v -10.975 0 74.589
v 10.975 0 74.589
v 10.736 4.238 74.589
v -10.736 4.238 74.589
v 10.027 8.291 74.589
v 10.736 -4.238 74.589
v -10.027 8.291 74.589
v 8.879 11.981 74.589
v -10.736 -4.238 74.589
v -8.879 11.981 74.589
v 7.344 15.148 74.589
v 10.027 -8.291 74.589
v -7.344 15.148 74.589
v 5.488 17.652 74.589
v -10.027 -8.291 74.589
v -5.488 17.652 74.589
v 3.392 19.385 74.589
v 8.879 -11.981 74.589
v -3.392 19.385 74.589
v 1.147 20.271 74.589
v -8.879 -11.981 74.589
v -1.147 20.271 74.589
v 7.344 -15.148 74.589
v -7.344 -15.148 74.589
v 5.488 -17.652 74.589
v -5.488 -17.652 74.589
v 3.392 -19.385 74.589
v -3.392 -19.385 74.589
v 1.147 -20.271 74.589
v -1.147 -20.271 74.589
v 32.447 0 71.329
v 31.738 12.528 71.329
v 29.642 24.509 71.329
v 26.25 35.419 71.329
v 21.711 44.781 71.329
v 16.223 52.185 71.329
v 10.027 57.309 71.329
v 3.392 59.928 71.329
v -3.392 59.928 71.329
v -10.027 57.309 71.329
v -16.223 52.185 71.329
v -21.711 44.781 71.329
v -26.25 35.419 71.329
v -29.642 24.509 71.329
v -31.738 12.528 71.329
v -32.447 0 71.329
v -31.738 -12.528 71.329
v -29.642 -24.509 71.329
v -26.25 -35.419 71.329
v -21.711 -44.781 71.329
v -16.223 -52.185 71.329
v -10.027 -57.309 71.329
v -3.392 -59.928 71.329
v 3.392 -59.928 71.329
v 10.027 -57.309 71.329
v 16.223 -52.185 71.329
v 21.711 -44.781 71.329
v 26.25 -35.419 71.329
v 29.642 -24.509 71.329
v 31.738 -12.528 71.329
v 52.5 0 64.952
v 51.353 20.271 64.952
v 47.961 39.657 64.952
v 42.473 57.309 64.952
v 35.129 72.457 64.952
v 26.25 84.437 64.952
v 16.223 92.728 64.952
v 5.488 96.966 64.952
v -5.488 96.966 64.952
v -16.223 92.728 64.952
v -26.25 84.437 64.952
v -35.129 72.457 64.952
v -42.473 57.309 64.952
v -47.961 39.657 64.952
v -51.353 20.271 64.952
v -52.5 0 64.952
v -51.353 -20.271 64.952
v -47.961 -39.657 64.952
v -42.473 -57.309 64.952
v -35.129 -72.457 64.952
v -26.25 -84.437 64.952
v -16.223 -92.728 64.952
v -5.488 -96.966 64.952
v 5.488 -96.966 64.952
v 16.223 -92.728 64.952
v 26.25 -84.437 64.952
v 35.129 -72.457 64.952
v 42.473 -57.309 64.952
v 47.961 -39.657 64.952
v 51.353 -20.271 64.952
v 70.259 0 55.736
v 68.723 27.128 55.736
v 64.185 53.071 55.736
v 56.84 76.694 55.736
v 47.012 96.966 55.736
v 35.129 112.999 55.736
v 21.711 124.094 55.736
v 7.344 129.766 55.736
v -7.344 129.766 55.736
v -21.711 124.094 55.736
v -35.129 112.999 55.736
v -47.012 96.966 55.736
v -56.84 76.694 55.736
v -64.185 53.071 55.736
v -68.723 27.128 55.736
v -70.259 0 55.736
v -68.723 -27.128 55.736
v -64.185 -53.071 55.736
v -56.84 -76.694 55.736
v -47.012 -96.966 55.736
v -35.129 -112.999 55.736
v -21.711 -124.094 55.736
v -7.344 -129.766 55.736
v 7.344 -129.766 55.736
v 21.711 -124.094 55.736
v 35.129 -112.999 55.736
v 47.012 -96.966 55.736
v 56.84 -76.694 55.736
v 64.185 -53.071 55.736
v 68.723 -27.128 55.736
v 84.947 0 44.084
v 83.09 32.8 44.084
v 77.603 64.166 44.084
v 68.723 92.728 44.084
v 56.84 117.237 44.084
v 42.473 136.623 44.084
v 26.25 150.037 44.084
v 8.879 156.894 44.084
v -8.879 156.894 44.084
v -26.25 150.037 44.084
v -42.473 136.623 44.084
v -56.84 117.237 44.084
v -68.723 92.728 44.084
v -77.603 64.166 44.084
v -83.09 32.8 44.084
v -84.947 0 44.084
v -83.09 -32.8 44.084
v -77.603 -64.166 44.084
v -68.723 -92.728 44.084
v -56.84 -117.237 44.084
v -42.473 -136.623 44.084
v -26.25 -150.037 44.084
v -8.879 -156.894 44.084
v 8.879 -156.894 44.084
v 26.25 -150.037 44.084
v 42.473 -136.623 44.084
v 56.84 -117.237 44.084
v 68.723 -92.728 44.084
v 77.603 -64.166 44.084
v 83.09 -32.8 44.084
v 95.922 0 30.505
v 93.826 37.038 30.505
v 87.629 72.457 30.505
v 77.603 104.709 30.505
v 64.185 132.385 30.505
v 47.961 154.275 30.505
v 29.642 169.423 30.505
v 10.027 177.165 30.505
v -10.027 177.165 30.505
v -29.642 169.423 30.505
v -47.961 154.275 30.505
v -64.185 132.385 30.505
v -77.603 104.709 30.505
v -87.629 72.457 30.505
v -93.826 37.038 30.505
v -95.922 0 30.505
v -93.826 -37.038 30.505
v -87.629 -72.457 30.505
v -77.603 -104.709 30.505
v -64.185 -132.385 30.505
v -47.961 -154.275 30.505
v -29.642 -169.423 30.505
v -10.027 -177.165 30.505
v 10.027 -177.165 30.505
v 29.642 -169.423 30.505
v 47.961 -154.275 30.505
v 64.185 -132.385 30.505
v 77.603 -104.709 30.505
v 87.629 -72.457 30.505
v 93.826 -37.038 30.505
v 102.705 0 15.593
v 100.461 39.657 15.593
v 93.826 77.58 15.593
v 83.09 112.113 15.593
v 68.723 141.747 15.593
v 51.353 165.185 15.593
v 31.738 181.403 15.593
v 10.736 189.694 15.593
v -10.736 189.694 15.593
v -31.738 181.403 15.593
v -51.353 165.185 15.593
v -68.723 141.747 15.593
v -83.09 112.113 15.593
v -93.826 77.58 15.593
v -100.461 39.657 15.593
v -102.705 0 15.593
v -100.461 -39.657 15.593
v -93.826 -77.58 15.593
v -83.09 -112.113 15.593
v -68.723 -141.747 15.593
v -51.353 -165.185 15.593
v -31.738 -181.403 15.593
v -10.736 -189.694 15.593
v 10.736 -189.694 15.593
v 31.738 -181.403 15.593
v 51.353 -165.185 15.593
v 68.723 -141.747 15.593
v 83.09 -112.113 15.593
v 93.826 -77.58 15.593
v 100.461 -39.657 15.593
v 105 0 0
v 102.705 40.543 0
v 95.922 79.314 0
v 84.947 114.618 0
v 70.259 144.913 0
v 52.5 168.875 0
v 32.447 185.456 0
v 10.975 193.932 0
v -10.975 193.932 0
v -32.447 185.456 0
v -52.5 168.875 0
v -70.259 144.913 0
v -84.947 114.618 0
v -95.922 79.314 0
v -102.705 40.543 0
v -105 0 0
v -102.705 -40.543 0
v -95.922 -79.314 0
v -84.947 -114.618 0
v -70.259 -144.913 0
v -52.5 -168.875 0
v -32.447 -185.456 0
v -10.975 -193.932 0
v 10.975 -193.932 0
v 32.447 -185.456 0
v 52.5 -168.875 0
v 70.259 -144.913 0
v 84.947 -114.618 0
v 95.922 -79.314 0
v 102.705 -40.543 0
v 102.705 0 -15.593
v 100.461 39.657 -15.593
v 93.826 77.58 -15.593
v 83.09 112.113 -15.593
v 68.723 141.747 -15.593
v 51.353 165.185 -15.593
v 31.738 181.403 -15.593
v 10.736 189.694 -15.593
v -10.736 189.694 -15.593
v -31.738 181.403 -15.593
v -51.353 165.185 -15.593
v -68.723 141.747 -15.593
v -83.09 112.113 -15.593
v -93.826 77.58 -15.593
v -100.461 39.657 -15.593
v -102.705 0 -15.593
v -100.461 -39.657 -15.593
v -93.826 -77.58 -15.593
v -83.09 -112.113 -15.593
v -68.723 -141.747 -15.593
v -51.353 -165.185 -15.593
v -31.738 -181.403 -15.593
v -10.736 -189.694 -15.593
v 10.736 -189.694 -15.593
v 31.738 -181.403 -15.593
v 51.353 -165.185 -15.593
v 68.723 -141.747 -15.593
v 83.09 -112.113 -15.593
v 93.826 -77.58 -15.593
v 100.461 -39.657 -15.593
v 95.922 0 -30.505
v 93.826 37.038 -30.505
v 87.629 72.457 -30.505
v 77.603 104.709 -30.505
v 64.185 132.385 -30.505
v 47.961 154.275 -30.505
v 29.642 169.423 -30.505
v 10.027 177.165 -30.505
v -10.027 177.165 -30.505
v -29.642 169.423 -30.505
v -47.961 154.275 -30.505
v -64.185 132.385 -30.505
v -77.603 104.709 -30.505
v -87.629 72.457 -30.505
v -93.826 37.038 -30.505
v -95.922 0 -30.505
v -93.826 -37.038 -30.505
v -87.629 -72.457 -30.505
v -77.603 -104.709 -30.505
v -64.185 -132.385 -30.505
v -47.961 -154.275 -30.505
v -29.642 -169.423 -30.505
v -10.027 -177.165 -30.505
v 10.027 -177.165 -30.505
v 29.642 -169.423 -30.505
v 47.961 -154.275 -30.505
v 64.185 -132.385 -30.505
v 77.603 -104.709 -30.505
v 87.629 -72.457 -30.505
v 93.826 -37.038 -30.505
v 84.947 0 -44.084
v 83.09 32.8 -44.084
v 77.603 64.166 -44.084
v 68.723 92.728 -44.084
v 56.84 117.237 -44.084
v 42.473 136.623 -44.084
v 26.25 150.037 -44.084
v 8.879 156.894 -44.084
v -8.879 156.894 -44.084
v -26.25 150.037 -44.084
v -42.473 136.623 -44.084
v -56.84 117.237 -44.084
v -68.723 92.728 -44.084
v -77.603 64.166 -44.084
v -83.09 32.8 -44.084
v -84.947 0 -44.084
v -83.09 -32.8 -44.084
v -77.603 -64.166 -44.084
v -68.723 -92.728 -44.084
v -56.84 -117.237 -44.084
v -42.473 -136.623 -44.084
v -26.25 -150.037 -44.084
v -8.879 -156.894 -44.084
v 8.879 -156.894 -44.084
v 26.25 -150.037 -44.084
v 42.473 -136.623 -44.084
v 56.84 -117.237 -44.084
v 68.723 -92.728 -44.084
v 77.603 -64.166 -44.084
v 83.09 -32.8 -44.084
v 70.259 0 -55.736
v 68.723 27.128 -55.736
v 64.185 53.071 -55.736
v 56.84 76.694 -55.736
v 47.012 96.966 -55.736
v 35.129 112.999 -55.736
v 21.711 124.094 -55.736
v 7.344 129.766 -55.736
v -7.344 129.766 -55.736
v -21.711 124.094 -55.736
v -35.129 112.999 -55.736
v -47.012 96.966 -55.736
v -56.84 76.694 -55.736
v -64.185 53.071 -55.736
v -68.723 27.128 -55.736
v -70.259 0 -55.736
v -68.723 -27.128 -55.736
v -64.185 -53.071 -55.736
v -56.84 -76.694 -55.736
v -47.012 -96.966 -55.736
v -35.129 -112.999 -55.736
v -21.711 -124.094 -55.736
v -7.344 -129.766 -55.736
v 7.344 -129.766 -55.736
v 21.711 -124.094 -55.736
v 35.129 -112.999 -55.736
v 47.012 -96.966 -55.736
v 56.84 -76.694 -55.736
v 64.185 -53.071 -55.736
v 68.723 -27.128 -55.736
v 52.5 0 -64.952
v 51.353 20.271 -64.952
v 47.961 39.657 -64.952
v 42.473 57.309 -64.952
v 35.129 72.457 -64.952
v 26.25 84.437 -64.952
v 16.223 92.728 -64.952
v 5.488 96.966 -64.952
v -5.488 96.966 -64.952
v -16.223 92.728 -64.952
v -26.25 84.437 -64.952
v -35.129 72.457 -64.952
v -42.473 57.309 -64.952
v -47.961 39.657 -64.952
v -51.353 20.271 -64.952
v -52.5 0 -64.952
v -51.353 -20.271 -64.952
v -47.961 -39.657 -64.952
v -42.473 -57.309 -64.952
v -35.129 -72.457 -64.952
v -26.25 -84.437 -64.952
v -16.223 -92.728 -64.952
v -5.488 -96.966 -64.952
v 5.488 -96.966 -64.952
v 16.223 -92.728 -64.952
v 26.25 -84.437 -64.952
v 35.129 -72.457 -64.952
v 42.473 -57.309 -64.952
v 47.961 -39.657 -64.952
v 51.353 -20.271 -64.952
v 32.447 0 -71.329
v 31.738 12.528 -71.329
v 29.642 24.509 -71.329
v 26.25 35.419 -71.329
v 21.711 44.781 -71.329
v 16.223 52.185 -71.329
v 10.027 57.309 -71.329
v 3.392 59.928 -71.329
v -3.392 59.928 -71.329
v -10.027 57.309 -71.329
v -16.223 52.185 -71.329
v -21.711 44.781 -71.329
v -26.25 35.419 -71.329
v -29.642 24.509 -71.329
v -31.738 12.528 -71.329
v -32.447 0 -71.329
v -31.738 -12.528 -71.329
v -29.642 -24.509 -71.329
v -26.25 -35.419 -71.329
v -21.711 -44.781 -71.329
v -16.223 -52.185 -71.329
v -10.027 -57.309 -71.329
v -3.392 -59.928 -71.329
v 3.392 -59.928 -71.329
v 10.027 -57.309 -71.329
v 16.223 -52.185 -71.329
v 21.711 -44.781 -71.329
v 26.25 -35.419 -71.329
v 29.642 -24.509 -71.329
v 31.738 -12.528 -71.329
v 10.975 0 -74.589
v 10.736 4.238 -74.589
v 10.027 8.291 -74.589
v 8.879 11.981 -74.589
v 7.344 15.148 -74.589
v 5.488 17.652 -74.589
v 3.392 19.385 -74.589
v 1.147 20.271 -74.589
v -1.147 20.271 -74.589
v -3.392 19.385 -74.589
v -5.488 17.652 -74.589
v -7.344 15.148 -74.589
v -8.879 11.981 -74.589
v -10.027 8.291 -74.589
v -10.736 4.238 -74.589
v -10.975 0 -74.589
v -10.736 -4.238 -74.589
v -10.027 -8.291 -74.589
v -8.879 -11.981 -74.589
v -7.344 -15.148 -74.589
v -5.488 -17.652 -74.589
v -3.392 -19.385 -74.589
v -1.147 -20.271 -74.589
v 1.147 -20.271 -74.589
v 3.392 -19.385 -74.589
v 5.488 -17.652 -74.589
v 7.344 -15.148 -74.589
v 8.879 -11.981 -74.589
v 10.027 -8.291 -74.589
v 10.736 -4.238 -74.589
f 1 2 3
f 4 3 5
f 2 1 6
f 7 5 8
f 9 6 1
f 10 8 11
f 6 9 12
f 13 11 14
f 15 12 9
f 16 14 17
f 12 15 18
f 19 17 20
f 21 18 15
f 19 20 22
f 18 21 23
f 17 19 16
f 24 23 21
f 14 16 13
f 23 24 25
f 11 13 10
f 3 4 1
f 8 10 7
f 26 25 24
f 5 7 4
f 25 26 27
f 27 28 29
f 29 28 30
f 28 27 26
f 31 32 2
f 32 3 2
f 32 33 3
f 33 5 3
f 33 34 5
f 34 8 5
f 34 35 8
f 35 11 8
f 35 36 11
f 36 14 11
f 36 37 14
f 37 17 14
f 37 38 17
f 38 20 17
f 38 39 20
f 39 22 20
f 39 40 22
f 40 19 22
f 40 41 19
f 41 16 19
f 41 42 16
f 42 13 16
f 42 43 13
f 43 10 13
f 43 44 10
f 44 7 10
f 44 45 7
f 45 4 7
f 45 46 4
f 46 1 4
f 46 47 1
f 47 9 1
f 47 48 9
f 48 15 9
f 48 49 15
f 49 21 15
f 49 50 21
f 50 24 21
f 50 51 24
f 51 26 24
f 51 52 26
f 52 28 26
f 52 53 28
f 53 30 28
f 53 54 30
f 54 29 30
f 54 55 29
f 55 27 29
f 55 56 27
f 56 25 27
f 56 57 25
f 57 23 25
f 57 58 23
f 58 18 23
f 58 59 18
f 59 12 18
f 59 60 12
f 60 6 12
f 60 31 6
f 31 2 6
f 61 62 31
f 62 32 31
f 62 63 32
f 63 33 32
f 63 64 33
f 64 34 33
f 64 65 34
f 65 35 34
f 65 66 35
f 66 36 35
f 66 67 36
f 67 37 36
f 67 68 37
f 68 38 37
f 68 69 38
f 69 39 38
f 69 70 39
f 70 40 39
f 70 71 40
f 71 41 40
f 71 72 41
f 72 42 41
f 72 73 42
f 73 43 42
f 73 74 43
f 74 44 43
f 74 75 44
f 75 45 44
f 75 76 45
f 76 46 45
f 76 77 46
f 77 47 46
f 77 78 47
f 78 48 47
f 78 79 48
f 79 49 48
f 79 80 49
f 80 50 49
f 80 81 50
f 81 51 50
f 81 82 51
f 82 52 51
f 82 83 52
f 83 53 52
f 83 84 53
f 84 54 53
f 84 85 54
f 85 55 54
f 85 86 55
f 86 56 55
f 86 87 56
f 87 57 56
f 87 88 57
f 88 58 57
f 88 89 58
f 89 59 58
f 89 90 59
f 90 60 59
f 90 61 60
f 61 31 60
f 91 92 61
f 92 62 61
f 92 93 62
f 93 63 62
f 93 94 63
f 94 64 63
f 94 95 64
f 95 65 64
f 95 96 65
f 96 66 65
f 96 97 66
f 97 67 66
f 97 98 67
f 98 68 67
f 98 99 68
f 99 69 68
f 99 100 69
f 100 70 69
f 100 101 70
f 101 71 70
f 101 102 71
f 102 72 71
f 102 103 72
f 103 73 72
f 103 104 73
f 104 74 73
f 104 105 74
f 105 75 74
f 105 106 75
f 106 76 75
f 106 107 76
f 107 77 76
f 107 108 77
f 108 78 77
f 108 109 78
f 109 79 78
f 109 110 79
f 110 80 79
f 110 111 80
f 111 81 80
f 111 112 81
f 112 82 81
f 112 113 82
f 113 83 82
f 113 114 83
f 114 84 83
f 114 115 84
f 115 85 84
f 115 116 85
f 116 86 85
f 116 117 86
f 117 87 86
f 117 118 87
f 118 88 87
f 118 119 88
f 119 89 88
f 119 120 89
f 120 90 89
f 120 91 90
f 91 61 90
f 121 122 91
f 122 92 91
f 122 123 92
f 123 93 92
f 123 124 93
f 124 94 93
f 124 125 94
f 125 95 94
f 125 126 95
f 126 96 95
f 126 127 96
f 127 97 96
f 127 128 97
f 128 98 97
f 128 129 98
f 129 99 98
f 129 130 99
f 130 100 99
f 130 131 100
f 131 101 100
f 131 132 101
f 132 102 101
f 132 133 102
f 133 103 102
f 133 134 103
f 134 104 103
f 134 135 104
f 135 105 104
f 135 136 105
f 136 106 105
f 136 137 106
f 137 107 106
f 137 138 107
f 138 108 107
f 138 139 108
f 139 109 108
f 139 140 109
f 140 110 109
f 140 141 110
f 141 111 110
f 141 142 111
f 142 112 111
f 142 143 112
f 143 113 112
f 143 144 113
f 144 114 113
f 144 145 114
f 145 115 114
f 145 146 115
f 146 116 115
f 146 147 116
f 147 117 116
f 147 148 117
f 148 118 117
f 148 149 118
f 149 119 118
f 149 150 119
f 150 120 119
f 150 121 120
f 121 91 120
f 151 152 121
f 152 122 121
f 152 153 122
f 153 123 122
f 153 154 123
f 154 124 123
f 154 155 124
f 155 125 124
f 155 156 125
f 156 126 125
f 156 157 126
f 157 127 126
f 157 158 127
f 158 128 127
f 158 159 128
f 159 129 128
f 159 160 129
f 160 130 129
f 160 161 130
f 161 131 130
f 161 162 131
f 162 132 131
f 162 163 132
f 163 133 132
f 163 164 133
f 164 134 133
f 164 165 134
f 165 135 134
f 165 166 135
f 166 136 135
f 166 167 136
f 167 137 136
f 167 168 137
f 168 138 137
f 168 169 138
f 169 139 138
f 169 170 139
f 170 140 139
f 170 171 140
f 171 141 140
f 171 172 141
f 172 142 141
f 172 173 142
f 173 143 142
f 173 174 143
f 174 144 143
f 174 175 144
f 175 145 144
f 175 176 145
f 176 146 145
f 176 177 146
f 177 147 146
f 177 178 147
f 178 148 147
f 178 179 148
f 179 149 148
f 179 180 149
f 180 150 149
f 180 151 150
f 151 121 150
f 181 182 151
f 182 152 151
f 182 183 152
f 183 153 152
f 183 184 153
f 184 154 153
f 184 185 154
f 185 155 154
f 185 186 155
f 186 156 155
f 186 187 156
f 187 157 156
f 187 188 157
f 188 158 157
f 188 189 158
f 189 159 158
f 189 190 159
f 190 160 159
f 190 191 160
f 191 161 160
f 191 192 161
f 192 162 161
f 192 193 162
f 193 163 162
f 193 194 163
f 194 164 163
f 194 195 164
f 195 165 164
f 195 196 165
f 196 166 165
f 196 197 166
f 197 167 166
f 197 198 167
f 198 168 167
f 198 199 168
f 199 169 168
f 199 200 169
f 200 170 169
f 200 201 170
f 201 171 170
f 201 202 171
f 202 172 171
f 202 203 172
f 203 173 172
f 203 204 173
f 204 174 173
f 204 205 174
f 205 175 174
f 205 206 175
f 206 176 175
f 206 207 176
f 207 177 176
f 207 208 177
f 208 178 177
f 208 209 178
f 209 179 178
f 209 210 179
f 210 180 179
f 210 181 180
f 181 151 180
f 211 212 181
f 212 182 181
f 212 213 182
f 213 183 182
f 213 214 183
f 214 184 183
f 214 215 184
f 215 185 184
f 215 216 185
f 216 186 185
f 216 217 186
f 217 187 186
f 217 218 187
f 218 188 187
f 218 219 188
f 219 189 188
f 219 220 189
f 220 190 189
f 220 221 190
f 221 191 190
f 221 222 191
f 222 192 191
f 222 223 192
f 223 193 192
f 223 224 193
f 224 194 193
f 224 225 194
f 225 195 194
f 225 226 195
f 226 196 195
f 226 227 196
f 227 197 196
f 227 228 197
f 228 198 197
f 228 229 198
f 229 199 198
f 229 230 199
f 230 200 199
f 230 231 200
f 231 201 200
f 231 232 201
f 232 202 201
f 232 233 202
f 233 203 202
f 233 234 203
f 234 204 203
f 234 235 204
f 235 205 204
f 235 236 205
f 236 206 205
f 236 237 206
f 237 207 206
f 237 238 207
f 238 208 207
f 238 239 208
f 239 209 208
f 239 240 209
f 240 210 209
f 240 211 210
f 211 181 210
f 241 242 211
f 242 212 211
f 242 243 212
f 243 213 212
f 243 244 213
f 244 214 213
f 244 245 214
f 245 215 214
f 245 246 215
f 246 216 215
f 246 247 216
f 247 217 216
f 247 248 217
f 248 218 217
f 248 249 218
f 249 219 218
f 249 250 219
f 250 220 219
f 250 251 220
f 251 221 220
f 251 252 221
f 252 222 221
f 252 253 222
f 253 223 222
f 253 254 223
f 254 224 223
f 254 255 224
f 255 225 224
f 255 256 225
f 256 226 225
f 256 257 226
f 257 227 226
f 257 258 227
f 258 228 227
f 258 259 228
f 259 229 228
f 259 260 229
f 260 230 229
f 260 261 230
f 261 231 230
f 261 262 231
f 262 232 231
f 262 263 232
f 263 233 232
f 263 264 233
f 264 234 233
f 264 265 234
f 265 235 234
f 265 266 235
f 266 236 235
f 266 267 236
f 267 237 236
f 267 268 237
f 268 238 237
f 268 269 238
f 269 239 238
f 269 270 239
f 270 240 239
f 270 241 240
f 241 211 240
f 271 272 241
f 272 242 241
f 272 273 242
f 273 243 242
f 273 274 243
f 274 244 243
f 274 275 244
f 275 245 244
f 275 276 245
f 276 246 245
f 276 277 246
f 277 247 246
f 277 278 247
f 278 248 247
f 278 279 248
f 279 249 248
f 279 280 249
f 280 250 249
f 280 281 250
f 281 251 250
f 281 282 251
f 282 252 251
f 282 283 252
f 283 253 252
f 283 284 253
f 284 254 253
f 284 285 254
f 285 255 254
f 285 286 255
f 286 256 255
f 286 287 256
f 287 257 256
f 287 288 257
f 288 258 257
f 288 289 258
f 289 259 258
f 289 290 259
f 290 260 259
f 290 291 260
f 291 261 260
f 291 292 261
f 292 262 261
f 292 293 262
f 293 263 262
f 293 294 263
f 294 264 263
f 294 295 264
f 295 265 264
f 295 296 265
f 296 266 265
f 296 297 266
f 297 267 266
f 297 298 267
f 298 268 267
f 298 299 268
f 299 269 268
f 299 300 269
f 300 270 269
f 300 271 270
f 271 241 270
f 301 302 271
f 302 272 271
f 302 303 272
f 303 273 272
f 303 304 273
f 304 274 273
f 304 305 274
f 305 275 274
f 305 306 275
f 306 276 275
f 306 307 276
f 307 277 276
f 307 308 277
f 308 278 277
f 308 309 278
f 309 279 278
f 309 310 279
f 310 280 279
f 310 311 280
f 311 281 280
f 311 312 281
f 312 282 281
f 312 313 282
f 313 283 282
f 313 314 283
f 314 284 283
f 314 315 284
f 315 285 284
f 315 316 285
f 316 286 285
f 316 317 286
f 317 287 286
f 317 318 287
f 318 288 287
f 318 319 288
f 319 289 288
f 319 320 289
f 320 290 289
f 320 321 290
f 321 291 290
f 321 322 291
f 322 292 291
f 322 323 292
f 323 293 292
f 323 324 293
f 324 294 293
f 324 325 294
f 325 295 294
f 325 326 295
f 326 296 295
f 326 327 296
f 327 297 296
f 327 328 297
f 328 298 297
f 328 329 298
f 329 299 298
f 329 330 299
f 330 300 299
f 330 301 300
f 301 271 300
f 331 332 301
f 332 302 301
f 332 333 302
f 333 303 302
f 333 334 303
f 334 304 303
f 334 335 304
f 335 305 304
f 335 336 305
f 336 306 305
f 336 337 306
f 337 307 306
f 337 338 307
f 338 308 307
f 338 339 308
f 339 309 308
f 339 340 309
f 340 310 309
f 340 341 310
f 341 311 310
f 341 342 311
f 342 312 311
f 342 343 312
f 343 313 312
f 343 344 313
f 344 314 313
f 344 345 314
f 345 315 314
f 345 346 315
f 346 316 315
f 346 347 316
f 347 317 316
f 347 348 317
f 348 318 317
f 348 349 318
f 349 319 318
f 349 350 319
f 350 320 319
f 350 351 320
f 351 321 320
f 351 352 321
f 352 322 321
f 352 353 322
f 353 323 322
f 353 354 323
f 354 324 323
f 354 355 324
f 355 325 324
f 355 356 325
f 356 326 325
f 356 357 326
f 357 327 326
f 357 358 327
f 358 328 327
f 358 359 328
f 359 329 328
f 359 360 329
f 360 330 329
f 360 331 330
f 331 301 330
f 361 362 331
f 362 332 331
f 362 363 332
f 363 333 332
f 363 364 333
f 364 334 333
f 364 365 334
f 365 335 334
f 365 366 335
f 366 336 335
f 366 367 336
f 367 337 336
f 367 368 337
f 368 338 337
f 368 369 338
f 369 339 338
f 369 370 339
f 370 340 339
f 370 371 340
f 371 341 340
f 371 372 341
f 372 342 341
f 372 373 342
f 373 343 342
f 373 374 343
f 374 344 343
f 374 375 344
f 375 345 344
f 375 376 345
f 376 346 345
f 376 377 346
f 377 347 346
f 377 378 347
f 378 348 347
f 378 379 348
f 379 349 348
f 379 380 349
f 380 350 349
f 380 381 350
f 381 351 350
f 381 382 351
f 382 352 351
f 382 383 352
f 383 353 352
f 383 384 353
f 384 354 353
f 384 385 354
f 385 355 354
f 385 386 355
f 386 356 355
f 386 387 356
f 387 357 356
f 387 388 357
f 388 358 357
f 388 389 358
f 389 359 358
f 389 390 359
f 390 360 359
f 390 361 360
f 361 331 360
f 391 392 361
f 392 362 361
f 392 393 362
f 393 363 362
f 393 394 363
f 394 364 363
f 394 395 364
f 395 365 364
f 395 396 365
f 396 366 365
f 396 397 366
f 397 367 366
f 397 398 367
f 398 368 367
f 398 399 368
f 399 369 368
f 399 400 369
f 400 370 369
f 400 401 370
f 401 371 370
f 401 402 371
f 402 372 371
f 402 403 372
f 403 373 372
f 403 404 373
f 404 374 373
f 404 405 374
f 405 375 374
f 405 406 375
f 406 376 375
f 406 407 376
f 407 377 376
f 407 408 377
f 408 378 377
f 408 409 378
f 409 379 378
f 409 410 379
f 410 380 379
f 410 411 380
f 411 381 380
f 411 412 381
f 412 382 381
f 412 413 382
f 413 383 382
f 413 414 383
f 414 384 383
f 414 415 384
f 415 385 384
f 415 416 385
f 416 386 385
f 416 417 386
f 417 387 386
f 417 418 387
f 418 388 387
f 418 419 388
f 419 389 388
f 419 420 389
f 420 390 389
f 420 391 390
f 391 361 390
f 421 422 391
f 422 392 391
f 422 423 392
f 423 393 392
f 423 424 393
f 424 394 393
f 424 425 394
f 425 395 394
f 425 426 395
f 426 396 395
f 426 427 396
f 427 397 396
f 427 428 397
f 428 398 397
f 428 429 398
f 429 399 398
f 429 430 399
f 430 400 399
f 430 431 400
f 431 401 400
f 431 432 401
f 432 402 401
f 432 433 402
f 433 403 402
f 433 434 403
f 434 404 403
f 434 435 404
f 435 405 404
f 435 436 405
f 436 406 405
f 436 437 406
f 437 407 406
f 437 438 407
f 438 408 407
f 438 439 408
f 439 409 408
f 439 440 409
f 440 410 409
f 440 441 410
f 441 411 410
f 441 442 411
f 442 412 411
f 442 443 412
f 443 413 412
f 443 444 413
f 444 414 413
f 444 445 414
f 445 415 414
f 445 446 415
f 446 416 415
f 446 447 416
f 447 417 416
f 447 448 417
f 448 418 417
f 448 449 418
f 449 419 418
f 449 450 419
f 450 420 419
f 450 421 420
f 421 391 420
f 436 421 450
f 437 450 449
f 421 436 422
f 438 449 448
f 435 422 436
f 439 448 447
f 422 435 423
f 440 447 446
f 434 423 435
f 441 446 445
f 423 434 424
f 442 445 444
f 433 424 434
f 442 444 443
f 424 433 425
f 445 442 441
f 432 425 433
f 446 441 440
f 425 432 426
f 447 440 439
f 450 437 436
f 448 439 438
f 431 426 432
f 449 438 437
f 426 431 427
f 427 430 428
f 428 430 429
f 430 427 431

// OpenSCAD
// Generated by SolidPython 1.0.1 on 2020-07-29 00:46:47


scale(v = [7, 13, 5]) {
	sphere(r = 15);
}
/***********************************************
*********      SolidPython code:      **********
************************************************
 
# import packages: SolidPython
from solid import *
from solid.utils import *
from itertools import chain, combinations, permutations


class Resize:

    def __init__(self, scad_file):
        self.scad_file = scad_file
        #self.scad_file = import_scad(scad_file)
        # cone/cylinder param:
        self.r1 = 0
        self.r2 = 0
        self.h = 0
        # rectangular prism param:
        self.w = 0
        self.l = 0
        # ellipse param:
        self.r = 0

    # import OpenScad code (file name corresponds to shape)


    # classify shape + parameters
    def assign(self, param1, param2, param3):
        if self.scad_file == 'cone.scad':
            self.r1 = param1
            self.r2 = param2
            self.h = param3
        elif self.scad_file == 'cylinder.scad':
            self.r1 = param1
            self.r2 = param2
            self.h = param3
        elif self.scad_file == 'rectangularPrism.scad':
            self.h = param1
            self.l = param2
            self.w = param3
        else:
            self.r = param1
            self.h = param2

    # resize parameters
    def iterate(self):
        x = range(3, 20, 2)
        i = 1
        if self.scad_file == 'cone.scad':
            tempList = list(permutations(x, 2))
            for temp in tempList:
                param1 = temp[0]
                param2 = temp[1]
                filepath = 'produced_scad_files/' + 'cone' + str(param1) + '_' + str(param2) + '_' + '.scad'
                scad_render_to_file(cylinder(h=param1, r1=param2, r2=0), filepath)

        elif self.scad_file == 'cylinder.scad':
            tempList = list(permutations(x, 3))
            for temp in tempList:
                param1 = temp[0]
                param2 = temp[1]
                filepath = 'produced_scad_files/' + 'cylinder' + str(param1) + '_' + str(param2) + '_' + '.scad'
                scad_render_to_file(cylinder(h=param1, r1=param2, r2=param2), filepath)

        elif self.scad_file == 'rectangularPrism.scad':
            tempList = list(permutations(x, 3))
            for temp in tempList:
                param1 = temp[0]
                param2 = temp[1]
                param3 = temp[2]
                filepath = 'produced_scad_files/' + 'rectangularPrism' + str(param1) + '_' + str(param2) + '_' + str(
                    param3) + '.scad'
                scad_render_to_file(cube(size=(param1, param2, param3)), filepath)

        elif self.scad_file == 'ellipse.scad':
            tempList = list(permutations(x, 4))
            for temp in tempList:
                param1 = temp[0]
                param2 = temp[1]
                param3 = temp[2]
                param4 = temp[3]
                filepath = 'produced_scad_files/' + 'ellipse' + str(param1) + '_' + str(param2) + '_' + str(param3) + '_' + str(param4) + '.scad'
                scad_render_to_file(scale([param1, param2, param3])(sphere(r=param4)), filepath)

    def render_to_scadfile(self):
        scad_render_to_file(scad, 'example.scad') 
 
************************************************/
